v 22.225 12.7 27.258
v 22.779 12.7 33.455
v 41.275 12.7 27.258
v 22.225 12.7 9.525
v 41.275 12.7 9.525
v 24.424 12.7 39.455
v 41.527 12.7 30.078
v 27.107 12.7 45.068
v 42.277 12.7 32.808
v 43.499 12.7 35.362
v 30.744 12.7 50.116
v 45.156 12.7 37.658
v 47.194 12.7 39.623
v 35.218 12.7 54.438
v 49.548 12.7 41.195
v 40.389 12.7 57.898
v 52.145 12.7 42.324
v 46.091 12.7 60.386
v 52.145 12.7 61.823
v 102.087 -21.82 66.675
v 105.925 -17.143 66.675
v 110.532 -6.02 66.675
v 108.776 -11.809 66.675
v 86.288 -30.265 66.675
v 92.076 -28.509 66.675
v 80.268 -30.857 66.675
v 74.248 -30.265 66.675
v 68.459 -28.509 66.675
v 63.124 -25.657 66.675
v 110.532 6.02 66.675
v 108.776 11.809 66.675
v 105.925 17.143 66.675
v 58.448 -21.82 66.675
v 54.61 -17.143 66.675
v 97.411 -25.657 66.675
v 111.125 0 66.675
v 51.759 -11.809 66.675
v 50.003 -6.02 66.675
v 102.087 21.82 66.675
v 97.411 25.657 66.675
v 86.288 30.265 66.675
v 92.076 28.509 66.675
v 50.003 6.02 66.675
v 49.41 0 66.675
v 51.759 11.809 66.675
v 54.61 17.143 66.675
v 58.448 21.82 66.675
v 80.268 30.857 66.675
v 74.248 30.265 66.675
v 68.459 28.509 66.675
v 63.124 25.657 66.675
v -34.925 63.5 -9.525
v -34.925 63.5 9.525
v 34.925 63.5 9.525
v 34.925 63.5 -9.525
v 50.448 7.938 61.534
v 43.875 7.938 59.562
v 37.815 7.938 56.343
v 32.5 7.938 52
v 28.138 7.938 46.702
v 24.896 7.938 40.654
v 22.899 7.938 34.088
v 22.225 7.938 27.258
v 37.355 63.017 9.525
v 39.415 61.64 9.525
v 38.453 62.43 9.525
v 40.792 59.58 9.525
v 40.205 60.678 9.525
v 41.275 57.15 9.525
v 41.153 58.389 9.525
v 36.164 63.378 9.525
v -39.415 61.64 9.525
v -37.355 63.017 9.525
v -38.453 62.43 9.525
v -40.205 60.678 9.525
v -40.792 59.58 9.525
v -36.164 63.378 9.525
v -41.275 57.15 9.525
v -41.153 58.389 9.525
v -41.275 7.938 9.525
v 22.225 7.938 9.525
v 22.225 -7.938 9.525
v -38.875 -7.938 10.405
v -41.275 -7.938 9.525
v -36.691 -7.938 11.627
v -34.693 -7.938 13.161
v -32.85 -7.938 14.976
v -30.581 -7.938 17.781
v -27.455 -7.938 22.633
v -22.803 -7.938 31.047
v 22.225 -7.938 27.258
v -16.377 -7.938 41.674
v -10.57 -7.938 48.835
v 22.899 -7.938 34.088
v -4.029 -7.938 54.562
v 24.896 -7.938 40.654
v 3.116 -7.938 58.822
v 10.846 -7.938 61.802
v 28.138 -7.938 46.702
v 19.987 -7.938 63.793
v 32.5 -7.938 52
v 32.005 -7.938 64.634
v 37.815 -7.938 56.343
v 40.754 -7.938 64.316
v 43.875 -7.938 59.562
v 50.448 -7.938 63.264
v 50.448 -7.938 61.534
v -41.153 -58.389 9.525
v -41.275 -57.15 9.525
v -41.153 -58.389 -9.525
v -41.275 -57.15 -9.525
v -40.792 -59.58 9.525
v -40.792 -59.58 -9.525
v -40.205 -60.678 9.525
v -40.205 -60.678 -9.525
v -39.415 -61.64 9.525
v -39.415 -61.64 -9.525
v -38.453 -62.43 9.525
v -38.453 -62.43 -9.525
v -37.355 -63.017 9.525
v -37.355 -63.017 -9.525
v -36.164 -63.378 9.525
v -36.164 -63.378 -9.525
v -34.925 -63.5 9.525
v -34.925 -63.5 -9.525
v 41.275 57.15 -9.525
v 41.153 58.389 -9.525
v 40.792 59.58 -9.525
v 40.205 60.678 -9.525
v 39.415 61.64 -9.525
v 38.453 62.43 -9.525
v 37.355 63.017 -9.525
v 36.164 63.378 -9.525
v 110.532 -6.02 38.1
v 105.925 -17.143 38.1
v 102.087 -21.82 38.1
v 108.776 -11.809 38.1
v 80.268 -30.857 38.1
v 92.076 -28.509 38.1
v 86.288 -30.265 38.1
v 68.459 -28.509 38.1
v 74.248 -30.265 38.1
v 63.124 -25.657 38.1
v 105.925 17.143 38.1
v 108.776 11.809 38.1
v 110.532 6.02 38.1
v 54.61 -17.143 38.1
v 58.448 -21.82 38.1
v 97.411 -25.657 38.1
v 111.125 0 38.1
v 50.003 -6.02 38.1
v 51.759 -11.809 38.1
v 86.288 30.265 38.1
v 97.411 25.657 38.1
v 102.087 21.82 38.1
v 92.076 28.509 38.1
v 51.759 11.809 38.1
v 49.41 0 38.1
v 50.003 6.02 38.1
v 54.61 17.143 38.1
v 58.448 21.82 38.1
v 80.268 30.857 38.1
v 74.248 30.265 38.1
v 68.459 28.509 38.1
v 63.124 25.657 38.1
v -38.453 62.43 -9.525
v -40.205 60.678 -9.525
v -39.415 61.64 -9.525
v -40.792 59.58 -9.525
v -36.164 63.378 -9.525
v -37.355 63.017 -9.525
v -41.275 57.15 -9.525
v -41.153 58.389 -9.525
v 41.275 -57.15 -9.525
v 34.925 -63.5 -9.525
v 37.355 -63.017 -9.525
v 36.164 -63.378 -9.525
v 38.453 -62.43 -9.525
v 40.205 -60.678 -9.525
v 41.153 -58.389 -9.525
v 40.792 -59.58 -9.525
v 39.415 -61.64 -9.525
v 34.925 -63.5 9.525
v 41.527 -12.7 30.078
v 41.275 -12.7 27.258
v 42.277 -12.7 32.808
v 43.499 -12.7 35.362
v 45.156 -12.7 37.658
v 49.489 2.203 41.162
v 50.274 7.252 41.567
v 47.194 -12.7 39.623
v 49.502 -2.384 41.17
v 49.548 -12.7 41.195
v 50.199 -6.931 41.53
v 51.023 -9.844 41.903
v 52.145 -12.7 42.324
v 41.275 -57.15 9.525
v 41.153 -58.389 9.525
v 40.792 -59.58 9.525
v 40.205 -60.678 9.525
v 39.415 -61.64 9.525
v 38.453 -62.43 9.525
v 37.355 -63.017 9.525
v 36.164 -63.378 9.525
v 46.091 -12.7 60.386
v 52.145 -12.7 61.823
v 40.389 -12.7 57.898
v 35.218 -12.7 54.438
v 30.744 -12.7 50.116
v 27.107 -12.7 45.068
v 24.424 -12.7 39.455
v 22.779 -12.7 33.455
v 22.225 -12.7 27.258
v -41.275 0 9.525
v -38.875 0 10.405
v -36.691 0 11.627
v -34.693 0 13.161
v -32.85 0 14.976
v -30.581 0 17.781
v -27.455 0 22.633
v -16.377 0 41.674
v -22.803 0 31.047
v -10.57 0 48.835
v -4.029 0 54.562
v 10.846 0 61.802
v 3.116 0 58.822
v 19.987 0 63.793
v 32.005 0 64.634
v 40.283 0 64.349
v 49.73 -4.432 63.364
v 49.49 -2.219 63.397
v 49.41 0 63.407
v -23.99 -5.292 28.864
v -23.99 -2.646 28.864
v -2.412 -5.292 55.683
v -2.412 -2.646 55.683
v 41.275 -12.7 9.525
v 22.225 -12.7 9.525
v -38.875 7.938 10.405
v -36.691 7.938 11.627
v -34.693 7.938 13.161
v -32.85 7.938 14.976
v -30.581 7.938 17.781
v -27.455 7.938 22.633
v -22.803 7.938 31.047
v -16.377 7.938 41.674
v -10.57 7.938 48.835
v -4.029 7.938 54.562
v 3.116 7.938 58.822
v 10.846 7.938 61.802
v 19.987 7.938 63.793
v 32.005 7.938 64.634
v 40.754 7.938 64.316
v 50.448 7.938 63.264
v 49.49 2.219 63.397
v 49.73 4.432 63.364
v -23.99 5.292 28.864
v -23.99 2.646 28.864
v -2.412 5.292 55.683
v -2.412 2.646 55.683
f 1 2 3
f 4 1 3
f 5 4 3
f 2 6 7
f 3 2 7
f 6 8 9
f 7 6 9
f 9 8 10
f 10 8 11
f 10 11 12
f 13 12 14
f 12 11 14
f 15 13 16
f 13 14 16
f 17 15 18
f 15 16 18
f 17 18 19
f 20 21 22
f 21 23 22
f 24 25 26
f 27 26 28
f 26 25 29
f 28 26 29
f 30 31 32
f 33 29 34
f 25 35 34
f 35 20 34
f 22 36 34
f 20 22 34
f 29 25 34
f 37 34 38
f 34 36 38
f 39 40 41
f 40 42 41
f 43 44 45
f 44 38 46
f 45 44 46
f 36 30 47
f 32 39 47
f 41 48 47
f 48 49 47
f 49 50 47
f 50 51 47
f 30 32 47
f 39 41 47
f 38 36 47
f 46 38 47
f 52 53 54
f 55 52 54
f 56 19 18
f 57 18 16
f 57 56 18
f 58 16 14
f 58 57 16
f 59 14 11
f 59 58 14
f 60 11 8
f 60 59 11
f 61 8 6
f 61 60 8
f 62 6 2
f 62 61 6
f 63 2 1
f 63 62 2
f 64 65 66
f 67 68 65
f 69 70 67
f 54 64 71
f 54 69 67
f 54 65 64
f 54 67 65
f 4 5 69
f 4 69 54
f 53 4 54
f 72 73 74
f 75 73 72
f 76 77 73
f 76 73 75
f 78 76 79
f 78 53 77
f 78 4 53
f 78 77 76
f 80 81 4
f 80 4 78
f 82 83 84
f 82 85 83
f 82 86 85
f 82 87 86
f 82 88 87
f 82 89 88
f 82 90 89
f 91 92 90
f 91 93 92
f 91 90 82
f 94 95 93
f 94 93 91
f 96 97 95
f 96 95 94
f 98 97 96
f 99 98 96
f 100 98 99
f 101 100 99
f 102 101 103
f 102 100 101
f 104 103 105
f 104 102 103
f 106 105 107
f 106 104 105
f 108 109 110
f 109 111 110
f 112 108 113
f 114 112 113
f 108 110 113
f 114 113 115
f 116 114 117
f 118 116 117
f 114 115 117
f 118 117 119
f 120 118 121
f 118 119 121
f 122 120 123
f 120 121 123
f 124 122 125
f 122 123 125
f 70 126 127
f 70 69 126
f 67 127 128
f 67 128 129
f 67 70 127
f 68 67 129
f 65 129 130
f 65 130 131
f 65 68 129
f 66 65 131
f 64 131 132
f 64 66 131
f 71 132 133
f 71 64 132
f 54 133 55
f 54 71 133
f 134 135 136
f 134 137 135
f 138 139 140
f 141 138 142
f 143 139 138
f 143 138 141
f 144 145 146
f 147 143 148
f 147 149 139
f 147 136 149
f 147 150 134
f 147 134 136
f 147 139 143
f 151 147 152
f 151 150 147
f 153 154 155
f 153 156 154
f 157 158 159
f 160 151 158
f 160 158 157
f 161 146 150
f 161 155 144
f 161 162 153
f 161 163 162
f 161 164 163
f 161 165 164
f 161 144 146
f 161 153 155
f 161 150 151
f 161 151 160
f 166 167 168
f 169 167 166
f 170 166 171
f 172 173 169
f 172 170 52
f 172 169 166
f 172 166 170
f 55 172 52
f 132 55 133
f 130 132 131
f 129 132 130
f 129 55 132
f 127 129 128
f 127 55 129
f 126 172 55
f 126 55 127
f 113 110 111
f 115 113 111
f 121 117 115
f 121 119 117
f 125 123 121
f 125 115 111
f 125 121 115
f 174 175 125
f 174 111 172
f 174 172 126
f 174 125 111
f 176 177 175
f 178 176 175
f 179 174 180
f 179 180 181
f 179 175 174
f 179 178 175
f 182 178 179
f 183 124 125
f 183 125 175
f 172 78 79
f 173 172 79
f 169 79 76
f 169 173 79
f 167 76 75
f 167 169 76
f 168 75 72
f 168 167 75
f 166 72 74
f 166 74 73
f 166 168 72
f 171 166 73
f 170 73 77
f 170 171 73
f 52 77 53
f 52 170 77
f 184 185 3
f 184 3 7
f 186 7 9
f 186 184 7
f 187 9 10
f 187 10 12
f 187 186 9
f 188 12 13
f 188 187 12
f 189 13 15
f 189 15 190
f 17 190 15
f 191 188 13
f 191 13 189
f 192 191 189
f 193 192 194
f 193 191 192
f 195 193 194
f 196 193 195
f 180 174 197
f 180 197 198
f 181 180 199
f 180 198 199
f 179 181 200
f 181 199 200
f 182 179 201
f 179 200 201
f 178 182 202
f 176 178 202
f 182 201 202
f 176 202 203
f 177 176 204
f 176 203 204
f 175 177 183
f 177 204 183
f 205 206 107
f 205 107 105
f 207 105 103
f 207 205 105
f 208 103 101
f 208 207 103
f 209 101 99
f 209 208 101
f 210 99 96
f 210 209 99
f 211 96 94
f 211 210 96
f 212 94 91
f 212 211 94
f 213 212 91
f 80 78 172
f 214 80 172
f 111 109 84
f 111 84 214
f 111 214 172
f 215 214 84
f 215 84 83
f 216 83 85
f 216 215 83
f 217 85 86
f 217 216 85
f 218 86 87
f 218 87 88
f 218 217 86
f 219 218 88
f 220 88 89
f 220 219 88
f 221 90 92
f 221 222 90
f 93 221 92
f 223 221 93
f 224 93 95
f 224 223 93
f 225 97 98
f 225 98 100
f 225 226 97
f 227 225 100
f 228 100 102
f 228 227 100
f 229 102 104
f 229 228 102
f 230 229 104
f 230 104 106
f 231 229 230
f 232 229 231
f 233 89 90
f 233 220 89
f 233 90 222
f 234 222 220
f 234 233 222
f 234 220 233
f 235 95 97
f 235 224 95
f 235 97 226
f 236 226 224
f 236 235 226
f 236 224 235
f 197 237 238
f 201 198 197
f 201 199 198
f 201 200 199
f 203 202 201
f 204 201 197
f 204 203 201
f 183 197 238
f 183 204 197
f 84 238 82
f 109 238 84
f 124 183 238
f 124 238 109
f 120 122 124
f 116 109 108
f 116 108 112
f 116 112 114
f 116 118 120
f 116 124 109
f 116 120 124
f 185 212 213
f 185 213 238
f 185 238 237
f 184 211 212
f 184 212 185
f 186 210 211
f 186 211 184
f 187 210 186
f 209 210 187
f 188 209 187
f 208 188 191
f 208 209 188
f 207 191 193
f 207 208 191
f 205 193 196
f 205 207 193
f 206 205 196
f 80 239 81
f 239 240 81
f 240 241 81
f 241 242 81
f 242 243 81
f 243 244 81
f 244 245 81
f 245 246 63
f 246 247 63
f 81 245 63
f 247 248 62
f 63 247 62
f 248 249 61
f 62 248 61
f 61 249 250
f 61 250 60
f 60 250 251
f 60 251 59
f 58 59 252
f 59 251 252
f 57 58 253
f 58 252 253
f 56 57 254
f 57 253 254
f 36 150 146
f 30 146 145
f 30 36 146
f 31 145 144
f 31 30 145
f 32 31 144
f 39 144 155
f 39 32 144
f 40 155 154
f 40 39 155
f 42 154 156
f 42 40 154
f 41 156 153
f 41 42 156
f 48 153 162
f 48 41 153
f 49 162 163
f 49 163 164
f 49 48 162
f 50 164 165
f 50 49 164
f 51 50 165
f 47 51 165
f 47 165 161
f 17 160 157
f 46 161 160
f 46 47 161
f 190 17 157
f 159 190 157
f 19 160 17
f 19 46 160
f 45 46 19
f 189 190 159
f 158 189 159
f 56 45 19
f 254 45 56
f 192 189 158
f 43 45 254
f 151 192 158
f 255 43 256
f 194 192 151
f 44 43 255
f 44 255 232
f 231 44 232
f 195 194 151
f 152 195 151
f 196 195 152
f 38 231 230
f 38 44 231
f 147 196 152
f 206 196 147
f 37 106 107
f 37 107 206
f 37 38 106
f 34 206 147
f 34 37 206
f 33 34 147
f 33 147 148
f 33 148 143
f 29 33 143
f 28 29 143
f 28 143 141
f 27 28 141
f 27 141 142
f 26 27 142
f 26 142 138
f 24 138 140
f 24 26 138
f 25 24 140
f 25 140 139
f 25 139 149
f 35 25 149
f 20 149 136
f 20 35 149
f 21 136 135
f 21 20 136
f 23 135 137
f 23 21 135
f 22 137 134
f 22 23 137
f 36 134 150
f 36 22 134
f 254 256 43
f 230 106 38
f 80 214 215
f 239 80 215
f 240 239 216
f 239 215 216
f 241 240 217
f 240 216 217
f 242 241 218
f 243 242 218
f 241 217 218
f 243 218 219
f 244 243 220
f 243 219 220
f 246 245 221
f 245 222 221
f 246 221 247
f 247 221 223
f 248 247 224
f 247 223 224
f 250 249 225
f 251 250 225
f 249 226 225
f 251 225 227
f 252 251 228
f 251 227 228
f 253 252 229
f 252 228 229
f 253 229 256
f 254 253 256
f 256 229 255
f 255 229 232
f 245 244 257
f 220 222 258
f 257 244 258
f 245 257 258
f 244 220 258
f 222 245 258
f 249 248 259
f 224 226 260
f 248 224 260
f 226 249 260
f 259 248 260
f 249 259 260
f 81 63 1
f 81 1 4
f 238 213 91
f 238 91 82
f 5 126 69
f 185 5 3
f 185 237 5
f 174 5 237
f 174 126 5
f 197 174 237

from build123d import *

# Parameters (mm, degrees)
F1_DEPTH = 63.5
F2_DEPTH = 12.7
F3_DEPTH = 7.9375
F0_W     = 30.857466
F0_H     = 28.575
F5_R     = 6.35


with BuildPart() as f1:
    # F0 (on Front) → F1 (new body, symmetric)
    with BuildSketch(Plane.XZ):
        Polygon((41.275, -9.525), (41.275, 9.525), (22.225, 9.525), (-41.275, 9.525), (-41.275, -9.525), align=None)
    extrude(amount=F1_DEPTH, both=True)

    # F0 (on Front) → F2 (join, symmetric)
    with BuildSketch(Plane.XZ):
        Polygon((60.325, 62.183225), (60.325, 43.133225), (60.325, 38.1), (80.267534, 38.1), (80.267534, 66.675), (60.325, 66.675), align=None)
        with BuildLine():
            Line((22.225, 9.525), (41.275, 9.525))
            Line((41.275, 9.525), (41.275, 27.258225))
            ThreePointArc((41.275, 27.258225), (45.92468, 38.483545), (57.15, 43.133225))
            Line((57.15, 43.133225), (60.325, 43.133225))
            Line((60.325, 43.133225), (60.325, 62.183225))
            Line((60.325, 62.183225), (57.15, 62.183225))
            ThreePointArc((57.15, 62.183225), (32.454296, 51.953929), (22.225, 27.258225))
            Line((22.225, 27.258225), (22.225, 9.525))
        make_face()
    extrude(amount=F2_DEPTH, both=True)

    # F0 (on Front) → F3 (join, symmetric)
    with BuildSketch(Plane.XZ):
        with BuildLine():
            Line((-41.275, 9.525), (22.225, 9.525))
            Line((22.225, 9.525), (22.225, 27.258225))
            ThreePointArc((22.225, 27.258225), (32.454296, 51.953929), (57.15, 62.183225))
            add(Edge.make_bspline(
                [(-41.275, 9.525), (-16.467026, 16.406592), (-27.628707, 77.485785), (57.15, 62.183225)],
                knots=[0, 0, 0, 0, 111.626024, 111.626024, 111.626024, 111.626024], degree=3))
        make_face()
    extrude(amount=F3_DEPTH, both=True)

    # F0 (on Front) → F4 (revolve)
    with BuildSketch(Plane.XZ):
        with Locations((95.696267, 52.3875)):
            Rectangle(F0_W, F0_H)
    revolve(axis=Axis((80.267534, 0, 52.3875), (0, 0, 1)))

    # F5
    f5_edges = [f1.edges().sort_by_distance(p)[0] for p in [
        (-41.275, -63.5, 0),
        (41.275, -63.5, 0),
        (41.275, 63.5, 0),
        (-41.275, 63.5, 0),
    ]]
    fillet(f5_edges, radius=F5_R)


solid = f1.part
